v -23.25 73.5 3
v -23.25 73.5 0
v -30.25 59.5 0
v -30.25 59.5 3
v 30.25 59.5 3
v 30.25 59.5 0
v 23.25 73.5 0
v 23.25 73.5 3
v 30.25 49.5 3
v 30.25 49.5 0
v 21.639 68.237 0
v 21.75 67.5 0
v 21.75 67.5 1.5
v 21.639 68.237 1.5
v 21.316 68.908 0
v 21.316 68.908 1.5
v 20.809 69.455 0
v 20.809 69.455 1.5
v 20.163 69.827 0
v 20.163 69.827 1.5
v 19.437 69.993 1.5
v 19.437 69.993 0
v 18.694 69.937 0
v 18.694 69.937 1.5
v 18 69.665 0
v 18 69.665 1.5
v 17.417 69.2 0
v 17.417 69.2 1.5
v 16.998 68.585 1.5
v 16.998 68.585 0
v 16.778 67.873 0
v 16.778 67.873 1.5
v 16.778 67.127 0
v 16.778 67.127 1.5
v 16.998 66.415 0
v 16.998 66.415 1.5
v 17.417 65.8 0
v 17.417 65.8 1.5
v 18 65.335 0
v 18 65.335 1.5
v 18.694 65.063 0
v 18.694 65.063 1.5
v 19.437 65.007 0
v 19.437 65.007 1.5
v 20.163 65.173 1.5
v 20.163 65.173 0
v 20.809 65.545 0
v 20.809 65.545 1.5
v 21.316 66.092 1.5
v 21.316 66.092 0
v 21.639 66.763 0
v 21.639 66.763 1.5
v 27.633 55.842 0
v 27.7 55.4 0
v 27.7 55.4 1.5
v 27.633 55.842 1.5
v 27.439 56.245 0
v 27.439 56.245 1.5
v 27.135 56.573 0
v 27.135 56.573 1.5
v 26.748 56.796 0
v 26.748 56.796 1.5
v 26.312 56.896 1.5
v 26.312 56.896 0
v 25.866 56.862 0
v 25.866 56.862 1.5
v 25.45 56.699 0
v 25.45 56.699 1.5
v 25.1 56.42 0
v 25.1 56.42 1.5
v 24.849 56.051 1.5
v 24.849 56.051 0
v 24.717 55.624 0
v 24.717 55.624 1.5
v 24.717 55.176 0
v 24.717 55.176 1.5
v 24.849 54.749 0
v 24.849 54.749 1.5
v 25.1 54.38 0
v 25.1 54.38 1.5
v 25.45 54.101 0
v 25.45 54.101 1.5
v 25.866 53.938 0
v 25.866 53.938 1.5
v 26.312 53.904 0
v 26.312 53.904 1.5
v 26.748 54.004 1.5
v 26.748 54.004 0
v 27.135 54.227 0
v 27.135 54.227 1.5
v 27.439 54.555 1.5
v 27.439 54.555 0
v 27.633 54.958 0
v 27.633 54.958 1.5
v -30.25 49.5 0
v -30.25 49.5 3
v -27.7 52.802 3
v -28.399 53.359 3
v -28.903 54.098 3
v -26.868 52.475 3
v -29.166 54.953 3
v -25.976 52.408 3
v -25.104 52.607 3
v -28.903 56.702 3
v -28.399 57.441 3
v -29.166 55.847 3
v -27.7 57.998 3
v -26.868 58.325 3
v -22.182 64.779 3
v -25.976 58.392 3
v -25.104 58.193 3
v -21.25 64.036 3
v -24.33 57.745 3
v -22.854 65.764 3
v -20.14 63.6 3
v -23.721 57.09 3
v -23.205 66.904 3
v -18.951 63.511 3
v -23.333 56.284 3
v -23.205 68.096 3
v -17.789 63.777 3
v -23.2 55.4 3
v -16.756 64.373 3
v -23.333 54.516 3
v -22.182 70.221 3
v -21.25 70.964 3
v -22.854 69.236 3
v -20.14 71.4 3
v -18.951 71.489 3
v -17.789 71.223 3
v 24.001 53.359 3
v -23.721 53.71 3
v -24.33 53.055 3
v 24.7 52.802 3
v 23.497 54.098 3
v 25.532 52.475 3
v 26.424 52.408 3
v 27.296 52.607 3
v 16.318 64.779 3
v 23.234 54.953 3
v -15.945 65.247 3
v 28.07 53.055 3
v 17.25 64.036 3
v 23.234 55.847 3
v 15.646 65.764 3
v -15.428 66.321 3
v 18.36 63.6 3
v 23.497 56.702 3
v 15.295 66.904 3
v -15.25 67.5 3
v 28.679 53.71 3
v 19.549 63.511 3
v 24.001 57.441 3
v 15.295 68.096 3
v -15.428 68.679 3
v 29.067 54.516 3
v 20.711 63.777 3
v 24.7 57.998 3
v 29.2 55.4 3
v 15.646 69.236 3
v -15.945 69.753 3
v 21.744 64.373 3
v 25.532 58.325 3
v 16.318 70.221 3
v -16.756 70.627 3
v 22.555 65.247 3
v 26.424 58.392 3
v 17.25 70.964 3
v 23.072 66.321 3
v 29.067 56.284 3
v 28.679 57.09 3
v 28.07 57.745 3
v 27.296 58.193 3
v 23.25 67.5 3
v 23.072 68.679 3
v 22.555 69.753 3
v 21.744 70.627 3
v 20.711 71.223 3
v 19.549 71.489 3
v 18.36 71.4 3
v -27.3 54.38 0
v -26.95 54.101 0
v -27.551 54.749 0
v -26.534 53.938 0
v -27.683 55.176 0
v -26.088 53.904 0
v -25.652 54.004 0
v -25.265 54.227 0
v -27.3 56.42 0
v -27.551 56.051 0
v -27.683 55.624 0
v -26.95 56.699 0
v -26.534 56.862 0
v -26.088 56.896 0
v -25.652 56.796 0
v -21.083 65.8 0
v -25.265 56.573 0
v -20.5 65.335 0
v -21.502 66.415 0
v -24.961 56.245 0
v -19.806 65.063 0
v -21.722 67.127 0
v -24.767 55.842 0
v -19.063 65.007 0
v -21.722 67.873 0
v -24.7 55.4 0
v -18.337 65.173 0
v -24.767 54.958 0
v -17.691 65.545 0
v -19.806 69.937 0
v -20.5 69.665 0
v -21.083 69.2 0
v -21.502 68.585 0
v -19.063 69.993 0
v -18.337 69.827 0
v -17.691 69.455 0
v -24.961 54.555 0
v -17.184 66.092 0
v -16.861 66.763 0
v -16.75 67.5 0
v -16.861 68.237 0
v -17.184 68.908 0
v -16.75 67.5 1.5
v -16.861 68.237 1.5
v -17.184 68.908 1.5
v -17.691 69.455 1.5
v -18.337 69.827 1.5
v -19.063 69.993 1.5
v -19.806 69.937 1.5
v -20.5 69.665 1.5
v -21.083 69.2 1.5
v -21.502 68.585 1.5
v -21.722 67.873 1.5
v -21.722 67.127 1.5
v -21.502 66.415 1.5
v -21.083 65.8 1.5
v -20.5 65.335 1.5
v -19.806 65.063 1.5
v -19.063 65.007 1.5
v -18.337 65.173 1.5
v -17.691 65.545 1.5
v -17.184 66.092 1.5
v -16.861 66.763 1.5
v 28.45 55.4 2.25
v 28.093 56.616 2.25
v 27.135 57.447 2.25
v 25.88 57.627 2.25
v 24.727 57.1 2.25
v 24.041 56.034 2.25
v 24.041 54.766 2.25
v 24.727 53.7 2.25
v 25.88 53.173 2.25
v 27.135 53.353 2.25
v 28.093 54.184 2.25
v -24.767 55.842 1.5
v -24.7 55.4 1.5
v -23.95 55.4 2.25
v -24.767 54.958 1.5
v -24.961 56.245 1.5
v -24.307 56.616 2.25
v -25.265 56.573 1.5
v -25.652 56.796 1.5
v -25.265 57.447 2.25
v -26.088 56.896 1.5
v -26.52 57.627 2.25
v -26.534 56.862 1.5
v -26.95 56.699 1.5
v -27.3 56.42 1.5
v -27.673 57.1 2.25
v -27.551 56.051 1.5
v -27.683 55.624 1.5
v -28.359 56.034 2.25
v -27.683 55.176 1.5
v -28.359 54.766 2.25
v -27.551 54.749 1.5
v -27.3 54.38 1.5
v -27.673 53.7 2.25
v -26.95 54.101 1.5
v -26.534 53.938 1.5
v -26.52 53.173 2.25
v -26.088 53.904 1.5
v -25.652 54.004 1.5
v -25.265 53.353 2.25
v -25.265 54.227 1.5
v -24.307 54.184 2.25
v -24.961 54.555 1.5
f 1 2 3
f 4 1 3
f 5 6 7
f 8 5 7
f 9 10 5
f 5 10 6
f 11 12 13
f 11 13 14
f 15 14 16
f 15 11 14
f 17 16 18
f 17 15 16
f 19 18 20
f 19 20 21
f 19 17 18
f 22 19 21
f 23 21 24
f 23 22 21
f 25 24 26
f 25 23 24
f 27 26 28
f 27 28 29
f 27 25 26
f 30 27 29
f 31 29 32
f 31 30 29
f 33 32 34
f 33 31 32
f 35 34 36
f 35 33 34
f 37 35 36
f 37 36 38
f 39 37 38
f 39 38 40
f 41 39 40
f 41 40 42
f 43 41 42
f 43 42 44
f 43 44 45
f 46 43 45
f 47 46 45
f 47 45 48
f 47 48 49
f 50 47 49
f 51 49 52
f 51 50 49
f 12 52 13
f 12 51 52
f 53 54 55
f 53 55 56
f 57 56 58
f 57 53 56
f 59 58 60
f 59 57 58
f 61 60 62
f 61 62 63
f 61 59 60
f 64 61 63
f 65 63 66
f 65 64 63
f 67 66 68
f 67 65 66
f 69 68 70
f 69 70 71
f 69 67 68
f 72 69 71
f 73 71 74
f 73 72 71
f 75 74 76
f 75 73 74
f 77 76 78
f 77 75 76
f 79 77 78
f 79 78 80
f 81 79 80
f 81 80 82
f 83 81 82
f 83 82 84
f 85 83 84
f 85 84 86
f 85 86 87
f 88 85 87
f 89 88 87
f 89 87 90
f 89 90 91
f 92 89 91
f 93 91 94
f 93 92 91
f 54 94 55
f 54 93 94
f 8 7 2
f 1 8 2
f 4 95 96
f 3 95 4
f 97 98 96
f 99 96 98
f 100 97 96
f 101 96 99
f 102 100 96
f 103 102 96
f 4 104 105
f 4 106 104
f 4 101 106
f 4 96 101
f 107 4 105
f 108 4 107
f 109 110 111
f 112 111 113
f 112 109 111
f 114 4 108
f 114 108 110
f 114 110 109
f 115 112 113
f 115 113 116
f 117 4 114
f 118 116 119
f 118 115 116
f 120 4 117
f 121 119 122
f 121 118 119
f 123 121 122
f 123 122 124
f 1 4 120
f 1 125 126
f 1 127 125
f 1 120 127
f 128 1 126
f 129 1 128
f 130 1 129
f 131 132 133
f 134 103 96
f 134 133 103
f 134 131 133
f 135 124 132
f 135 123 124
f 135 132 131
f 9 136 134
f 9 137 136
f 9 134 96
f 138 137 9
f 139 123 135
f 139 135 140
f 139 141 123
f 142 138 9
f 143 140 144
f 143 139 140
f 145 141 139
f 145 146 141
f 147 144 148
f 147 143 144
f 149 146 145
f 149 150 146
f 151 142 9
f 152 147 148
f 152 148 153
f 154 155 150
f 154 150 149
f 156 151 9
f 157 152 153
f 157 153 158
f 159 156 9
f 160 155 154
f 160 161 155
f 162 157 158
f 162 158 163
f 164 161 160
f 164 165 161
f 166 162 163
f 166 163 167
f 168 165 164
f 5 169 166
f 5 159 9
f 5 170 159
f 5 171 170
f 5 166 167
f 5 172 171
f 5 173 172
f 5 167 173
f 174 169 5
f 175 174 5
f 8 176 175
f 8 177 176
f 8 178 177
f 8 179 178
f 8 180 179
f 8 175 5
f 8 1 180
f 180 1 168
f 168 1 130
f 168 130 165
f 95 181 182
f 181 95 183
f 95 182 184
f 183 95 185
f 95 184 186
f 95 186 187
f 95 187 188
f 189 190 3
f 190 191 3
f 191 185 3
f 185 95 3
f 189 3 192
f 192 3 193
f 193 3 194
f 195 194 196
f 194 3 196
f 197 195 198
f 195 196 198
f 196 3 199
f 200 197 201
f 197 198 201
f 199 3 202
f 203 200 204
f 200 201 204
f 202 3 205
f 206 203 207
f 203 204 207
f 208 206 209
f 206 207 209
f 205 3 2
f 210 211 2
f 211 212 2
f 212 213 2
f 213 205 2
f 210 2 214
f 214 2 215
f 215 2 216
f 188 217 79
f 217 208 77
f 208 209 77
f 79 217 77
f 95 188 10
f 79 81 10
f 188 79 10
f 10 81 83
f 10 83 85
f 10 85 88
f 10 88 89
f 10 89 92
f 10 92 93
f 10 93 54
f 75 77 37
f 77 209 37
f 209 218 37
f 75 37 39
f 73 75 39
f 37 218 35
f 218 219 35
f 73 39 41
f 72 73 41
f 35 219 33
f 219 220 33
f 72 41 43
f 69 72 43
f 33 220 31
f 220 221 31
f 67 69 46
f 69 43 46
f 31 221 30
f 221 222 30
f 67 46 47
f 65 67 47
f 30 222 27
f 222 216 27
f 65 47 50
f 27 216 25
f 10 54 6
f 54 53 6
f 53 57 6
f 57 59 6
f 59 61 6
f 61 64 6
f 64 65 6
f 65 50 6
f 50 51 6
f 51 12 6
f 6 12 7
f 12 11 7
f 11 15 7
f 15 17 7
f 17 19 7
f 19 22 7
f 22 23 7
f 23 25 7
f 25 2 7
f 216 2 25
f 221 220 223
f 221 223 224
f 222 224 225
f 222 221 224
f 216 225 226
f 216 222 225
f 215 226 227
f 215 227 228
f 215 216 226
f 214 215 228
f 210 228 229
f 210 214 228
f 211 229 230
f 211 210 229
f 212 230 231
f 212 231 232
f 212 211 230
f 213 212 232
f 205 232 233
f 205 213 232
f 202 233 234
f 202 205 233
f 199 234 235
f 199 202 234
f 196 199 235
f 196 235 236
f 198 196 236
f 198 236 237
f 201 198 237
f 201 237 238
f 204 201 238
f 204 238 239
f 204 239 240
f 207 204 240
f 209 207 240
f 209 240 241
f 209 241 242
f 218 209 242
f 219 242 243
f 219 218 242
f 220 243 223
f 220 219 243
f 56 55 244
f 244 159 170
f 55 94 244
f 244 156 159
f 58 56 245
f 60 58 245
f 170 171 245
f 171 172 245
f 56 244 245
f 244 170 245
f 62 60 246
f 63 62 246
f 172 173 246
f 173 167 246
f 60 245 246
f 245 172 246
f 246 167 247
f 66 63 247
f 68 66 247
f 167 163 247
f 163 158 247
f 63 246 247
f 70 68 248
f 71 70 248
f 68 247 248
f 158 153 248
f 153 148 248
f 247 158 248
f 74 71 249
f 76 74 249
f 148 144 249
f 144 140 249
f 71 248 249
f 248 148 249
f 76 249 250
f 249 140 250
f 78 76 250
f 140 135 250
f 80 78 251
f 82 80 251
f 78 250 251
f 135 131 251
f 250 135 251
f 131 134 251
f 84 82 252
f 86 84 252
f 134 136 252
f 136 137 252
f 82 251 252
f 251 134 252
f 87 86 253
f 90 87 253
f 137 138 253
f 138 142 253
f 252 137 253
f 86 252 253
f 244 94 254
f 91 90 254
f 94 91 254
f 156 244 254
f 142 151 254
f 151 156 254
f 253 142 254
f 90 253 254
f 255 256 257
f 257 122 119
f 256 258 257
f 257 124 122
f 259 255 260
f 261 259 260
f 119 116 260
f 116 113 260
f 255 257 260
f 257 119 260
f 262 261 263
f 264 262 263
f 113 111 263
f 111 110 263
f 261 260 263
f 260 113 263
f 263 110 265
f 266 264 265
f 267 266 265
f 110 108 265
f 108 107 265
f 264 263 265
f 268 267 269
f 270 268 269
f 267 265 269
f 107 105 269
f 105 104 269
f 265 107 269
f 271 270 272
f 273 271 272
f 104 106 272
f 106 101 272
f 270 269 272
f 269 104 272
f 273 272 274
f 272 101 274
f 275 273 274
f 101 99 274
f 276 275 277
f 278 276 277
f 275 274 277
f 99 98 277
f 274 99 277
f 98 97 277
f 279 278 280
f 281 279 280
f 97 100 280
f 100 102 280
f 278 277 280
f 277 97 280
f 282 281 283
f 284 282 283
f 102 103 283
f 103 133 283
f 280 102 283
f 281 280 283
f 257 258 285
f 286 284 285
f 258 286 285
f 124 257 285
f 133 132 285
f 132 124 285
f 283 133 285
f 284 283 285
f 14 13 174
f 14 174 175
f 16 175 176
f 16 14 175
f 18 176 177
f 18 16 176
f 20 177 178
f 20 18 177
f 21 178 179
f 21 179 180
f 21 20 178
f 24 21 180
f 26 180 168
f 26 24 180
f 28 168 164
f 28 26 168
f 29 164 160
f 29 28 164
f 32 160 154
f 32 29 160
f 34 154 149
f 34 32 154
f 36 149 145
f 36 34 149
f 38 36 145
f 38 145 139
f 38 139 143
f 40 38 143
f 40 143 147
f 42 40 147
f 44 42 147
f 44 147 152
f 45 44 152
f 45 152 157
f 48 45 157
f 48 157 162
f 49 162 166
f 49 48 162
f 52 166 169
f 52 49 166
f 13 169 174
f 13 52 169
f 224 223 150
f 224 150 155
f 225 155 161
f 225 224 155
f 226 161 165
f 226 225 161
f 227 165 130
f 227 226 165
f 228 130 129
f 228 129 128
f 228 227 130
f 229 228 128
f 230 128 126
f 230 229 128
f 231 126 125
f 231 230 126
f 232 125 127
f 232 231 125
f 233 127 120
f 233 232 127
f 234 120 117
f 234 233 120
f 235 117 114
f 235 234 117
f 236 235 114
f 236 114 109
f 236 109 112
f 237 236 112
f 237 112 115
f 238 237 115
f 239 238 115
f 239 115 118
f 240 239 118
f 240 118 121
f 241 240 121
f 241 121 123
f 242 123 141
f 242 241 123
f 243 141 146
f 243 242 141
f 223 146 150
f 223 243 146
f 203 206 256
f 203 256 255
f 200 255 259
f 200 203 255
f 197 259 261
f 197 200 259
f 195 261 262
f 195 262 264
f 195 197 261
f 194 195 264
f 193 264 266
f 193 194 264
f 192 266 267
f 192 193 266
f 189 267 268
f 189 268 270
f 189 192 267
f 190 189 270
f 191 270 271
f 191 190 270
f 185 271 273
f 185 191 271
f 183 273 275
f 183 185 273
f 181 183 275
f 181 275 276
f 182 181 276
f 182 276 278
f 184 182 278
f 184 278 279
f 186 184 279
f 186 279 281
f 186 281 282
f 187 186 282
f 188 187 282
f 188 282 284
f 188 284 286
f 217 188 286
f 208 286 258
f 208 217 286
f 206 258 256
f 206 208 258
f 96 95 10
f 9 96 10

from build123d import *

# Parameters (mm, degrees)
F0_W     = 60.5
F0_H     = 10
F0_R     = 1.5
F0_R_2   = 2.5
F1_DEPTH = 3
F2_SIZE  = 1.5
F3_SIZE  = 1.5


# Not quite as in the source:
# - a feature names something its author has since deleted; it is built from what else it names


with BuildPart() as f1:
    # F0 (on Top) → F1 (new body)
    with BuildSketch(Plane.XY):
        with Locations((0, 54.5)):
            Rectangle(F0_W, F0_H)
        with Locations((-26.2, 55.4)):
            Circle(F0_R, mode=Mode.SUBTRACT)
        with Locations((26.2, 55.4)):
            Circle(F0_R, mode=Mode.SUBTRACT)
        Polygon((-23.25, 73.5), (-30.25, 59.5), (30.25, 59.5), (23.25, 73.5), align=None)
        with Locations((-19.25, 67.5)):
            Circle(F0_R_2, mode=Mode.SUBTRACT)
        with Locations((19.25, 67.5)):
            Circle(F0_R_2, mode=Mode.SUBTRACT)
    extrude(amount=F1_DEPTH)

    # F2
    f2_edges = [f1.edges().sort_by_distance(p)[0] for p in [
        (-27.7, 55.4, 3),
        (24.7, 55.4, 3),
    ]]
    chamfer(f2_edges, length=F2_SIZE)

    # F3
    f3_edges = [f1.edges().sort_by_distance(p)[0] for p in [
        (16.75, 67.5, 3),
        (-21.75, 67.5, 3),
    ]]
    chamfer(f3_edges, length=F3_SIZE)


solid = f1.part
